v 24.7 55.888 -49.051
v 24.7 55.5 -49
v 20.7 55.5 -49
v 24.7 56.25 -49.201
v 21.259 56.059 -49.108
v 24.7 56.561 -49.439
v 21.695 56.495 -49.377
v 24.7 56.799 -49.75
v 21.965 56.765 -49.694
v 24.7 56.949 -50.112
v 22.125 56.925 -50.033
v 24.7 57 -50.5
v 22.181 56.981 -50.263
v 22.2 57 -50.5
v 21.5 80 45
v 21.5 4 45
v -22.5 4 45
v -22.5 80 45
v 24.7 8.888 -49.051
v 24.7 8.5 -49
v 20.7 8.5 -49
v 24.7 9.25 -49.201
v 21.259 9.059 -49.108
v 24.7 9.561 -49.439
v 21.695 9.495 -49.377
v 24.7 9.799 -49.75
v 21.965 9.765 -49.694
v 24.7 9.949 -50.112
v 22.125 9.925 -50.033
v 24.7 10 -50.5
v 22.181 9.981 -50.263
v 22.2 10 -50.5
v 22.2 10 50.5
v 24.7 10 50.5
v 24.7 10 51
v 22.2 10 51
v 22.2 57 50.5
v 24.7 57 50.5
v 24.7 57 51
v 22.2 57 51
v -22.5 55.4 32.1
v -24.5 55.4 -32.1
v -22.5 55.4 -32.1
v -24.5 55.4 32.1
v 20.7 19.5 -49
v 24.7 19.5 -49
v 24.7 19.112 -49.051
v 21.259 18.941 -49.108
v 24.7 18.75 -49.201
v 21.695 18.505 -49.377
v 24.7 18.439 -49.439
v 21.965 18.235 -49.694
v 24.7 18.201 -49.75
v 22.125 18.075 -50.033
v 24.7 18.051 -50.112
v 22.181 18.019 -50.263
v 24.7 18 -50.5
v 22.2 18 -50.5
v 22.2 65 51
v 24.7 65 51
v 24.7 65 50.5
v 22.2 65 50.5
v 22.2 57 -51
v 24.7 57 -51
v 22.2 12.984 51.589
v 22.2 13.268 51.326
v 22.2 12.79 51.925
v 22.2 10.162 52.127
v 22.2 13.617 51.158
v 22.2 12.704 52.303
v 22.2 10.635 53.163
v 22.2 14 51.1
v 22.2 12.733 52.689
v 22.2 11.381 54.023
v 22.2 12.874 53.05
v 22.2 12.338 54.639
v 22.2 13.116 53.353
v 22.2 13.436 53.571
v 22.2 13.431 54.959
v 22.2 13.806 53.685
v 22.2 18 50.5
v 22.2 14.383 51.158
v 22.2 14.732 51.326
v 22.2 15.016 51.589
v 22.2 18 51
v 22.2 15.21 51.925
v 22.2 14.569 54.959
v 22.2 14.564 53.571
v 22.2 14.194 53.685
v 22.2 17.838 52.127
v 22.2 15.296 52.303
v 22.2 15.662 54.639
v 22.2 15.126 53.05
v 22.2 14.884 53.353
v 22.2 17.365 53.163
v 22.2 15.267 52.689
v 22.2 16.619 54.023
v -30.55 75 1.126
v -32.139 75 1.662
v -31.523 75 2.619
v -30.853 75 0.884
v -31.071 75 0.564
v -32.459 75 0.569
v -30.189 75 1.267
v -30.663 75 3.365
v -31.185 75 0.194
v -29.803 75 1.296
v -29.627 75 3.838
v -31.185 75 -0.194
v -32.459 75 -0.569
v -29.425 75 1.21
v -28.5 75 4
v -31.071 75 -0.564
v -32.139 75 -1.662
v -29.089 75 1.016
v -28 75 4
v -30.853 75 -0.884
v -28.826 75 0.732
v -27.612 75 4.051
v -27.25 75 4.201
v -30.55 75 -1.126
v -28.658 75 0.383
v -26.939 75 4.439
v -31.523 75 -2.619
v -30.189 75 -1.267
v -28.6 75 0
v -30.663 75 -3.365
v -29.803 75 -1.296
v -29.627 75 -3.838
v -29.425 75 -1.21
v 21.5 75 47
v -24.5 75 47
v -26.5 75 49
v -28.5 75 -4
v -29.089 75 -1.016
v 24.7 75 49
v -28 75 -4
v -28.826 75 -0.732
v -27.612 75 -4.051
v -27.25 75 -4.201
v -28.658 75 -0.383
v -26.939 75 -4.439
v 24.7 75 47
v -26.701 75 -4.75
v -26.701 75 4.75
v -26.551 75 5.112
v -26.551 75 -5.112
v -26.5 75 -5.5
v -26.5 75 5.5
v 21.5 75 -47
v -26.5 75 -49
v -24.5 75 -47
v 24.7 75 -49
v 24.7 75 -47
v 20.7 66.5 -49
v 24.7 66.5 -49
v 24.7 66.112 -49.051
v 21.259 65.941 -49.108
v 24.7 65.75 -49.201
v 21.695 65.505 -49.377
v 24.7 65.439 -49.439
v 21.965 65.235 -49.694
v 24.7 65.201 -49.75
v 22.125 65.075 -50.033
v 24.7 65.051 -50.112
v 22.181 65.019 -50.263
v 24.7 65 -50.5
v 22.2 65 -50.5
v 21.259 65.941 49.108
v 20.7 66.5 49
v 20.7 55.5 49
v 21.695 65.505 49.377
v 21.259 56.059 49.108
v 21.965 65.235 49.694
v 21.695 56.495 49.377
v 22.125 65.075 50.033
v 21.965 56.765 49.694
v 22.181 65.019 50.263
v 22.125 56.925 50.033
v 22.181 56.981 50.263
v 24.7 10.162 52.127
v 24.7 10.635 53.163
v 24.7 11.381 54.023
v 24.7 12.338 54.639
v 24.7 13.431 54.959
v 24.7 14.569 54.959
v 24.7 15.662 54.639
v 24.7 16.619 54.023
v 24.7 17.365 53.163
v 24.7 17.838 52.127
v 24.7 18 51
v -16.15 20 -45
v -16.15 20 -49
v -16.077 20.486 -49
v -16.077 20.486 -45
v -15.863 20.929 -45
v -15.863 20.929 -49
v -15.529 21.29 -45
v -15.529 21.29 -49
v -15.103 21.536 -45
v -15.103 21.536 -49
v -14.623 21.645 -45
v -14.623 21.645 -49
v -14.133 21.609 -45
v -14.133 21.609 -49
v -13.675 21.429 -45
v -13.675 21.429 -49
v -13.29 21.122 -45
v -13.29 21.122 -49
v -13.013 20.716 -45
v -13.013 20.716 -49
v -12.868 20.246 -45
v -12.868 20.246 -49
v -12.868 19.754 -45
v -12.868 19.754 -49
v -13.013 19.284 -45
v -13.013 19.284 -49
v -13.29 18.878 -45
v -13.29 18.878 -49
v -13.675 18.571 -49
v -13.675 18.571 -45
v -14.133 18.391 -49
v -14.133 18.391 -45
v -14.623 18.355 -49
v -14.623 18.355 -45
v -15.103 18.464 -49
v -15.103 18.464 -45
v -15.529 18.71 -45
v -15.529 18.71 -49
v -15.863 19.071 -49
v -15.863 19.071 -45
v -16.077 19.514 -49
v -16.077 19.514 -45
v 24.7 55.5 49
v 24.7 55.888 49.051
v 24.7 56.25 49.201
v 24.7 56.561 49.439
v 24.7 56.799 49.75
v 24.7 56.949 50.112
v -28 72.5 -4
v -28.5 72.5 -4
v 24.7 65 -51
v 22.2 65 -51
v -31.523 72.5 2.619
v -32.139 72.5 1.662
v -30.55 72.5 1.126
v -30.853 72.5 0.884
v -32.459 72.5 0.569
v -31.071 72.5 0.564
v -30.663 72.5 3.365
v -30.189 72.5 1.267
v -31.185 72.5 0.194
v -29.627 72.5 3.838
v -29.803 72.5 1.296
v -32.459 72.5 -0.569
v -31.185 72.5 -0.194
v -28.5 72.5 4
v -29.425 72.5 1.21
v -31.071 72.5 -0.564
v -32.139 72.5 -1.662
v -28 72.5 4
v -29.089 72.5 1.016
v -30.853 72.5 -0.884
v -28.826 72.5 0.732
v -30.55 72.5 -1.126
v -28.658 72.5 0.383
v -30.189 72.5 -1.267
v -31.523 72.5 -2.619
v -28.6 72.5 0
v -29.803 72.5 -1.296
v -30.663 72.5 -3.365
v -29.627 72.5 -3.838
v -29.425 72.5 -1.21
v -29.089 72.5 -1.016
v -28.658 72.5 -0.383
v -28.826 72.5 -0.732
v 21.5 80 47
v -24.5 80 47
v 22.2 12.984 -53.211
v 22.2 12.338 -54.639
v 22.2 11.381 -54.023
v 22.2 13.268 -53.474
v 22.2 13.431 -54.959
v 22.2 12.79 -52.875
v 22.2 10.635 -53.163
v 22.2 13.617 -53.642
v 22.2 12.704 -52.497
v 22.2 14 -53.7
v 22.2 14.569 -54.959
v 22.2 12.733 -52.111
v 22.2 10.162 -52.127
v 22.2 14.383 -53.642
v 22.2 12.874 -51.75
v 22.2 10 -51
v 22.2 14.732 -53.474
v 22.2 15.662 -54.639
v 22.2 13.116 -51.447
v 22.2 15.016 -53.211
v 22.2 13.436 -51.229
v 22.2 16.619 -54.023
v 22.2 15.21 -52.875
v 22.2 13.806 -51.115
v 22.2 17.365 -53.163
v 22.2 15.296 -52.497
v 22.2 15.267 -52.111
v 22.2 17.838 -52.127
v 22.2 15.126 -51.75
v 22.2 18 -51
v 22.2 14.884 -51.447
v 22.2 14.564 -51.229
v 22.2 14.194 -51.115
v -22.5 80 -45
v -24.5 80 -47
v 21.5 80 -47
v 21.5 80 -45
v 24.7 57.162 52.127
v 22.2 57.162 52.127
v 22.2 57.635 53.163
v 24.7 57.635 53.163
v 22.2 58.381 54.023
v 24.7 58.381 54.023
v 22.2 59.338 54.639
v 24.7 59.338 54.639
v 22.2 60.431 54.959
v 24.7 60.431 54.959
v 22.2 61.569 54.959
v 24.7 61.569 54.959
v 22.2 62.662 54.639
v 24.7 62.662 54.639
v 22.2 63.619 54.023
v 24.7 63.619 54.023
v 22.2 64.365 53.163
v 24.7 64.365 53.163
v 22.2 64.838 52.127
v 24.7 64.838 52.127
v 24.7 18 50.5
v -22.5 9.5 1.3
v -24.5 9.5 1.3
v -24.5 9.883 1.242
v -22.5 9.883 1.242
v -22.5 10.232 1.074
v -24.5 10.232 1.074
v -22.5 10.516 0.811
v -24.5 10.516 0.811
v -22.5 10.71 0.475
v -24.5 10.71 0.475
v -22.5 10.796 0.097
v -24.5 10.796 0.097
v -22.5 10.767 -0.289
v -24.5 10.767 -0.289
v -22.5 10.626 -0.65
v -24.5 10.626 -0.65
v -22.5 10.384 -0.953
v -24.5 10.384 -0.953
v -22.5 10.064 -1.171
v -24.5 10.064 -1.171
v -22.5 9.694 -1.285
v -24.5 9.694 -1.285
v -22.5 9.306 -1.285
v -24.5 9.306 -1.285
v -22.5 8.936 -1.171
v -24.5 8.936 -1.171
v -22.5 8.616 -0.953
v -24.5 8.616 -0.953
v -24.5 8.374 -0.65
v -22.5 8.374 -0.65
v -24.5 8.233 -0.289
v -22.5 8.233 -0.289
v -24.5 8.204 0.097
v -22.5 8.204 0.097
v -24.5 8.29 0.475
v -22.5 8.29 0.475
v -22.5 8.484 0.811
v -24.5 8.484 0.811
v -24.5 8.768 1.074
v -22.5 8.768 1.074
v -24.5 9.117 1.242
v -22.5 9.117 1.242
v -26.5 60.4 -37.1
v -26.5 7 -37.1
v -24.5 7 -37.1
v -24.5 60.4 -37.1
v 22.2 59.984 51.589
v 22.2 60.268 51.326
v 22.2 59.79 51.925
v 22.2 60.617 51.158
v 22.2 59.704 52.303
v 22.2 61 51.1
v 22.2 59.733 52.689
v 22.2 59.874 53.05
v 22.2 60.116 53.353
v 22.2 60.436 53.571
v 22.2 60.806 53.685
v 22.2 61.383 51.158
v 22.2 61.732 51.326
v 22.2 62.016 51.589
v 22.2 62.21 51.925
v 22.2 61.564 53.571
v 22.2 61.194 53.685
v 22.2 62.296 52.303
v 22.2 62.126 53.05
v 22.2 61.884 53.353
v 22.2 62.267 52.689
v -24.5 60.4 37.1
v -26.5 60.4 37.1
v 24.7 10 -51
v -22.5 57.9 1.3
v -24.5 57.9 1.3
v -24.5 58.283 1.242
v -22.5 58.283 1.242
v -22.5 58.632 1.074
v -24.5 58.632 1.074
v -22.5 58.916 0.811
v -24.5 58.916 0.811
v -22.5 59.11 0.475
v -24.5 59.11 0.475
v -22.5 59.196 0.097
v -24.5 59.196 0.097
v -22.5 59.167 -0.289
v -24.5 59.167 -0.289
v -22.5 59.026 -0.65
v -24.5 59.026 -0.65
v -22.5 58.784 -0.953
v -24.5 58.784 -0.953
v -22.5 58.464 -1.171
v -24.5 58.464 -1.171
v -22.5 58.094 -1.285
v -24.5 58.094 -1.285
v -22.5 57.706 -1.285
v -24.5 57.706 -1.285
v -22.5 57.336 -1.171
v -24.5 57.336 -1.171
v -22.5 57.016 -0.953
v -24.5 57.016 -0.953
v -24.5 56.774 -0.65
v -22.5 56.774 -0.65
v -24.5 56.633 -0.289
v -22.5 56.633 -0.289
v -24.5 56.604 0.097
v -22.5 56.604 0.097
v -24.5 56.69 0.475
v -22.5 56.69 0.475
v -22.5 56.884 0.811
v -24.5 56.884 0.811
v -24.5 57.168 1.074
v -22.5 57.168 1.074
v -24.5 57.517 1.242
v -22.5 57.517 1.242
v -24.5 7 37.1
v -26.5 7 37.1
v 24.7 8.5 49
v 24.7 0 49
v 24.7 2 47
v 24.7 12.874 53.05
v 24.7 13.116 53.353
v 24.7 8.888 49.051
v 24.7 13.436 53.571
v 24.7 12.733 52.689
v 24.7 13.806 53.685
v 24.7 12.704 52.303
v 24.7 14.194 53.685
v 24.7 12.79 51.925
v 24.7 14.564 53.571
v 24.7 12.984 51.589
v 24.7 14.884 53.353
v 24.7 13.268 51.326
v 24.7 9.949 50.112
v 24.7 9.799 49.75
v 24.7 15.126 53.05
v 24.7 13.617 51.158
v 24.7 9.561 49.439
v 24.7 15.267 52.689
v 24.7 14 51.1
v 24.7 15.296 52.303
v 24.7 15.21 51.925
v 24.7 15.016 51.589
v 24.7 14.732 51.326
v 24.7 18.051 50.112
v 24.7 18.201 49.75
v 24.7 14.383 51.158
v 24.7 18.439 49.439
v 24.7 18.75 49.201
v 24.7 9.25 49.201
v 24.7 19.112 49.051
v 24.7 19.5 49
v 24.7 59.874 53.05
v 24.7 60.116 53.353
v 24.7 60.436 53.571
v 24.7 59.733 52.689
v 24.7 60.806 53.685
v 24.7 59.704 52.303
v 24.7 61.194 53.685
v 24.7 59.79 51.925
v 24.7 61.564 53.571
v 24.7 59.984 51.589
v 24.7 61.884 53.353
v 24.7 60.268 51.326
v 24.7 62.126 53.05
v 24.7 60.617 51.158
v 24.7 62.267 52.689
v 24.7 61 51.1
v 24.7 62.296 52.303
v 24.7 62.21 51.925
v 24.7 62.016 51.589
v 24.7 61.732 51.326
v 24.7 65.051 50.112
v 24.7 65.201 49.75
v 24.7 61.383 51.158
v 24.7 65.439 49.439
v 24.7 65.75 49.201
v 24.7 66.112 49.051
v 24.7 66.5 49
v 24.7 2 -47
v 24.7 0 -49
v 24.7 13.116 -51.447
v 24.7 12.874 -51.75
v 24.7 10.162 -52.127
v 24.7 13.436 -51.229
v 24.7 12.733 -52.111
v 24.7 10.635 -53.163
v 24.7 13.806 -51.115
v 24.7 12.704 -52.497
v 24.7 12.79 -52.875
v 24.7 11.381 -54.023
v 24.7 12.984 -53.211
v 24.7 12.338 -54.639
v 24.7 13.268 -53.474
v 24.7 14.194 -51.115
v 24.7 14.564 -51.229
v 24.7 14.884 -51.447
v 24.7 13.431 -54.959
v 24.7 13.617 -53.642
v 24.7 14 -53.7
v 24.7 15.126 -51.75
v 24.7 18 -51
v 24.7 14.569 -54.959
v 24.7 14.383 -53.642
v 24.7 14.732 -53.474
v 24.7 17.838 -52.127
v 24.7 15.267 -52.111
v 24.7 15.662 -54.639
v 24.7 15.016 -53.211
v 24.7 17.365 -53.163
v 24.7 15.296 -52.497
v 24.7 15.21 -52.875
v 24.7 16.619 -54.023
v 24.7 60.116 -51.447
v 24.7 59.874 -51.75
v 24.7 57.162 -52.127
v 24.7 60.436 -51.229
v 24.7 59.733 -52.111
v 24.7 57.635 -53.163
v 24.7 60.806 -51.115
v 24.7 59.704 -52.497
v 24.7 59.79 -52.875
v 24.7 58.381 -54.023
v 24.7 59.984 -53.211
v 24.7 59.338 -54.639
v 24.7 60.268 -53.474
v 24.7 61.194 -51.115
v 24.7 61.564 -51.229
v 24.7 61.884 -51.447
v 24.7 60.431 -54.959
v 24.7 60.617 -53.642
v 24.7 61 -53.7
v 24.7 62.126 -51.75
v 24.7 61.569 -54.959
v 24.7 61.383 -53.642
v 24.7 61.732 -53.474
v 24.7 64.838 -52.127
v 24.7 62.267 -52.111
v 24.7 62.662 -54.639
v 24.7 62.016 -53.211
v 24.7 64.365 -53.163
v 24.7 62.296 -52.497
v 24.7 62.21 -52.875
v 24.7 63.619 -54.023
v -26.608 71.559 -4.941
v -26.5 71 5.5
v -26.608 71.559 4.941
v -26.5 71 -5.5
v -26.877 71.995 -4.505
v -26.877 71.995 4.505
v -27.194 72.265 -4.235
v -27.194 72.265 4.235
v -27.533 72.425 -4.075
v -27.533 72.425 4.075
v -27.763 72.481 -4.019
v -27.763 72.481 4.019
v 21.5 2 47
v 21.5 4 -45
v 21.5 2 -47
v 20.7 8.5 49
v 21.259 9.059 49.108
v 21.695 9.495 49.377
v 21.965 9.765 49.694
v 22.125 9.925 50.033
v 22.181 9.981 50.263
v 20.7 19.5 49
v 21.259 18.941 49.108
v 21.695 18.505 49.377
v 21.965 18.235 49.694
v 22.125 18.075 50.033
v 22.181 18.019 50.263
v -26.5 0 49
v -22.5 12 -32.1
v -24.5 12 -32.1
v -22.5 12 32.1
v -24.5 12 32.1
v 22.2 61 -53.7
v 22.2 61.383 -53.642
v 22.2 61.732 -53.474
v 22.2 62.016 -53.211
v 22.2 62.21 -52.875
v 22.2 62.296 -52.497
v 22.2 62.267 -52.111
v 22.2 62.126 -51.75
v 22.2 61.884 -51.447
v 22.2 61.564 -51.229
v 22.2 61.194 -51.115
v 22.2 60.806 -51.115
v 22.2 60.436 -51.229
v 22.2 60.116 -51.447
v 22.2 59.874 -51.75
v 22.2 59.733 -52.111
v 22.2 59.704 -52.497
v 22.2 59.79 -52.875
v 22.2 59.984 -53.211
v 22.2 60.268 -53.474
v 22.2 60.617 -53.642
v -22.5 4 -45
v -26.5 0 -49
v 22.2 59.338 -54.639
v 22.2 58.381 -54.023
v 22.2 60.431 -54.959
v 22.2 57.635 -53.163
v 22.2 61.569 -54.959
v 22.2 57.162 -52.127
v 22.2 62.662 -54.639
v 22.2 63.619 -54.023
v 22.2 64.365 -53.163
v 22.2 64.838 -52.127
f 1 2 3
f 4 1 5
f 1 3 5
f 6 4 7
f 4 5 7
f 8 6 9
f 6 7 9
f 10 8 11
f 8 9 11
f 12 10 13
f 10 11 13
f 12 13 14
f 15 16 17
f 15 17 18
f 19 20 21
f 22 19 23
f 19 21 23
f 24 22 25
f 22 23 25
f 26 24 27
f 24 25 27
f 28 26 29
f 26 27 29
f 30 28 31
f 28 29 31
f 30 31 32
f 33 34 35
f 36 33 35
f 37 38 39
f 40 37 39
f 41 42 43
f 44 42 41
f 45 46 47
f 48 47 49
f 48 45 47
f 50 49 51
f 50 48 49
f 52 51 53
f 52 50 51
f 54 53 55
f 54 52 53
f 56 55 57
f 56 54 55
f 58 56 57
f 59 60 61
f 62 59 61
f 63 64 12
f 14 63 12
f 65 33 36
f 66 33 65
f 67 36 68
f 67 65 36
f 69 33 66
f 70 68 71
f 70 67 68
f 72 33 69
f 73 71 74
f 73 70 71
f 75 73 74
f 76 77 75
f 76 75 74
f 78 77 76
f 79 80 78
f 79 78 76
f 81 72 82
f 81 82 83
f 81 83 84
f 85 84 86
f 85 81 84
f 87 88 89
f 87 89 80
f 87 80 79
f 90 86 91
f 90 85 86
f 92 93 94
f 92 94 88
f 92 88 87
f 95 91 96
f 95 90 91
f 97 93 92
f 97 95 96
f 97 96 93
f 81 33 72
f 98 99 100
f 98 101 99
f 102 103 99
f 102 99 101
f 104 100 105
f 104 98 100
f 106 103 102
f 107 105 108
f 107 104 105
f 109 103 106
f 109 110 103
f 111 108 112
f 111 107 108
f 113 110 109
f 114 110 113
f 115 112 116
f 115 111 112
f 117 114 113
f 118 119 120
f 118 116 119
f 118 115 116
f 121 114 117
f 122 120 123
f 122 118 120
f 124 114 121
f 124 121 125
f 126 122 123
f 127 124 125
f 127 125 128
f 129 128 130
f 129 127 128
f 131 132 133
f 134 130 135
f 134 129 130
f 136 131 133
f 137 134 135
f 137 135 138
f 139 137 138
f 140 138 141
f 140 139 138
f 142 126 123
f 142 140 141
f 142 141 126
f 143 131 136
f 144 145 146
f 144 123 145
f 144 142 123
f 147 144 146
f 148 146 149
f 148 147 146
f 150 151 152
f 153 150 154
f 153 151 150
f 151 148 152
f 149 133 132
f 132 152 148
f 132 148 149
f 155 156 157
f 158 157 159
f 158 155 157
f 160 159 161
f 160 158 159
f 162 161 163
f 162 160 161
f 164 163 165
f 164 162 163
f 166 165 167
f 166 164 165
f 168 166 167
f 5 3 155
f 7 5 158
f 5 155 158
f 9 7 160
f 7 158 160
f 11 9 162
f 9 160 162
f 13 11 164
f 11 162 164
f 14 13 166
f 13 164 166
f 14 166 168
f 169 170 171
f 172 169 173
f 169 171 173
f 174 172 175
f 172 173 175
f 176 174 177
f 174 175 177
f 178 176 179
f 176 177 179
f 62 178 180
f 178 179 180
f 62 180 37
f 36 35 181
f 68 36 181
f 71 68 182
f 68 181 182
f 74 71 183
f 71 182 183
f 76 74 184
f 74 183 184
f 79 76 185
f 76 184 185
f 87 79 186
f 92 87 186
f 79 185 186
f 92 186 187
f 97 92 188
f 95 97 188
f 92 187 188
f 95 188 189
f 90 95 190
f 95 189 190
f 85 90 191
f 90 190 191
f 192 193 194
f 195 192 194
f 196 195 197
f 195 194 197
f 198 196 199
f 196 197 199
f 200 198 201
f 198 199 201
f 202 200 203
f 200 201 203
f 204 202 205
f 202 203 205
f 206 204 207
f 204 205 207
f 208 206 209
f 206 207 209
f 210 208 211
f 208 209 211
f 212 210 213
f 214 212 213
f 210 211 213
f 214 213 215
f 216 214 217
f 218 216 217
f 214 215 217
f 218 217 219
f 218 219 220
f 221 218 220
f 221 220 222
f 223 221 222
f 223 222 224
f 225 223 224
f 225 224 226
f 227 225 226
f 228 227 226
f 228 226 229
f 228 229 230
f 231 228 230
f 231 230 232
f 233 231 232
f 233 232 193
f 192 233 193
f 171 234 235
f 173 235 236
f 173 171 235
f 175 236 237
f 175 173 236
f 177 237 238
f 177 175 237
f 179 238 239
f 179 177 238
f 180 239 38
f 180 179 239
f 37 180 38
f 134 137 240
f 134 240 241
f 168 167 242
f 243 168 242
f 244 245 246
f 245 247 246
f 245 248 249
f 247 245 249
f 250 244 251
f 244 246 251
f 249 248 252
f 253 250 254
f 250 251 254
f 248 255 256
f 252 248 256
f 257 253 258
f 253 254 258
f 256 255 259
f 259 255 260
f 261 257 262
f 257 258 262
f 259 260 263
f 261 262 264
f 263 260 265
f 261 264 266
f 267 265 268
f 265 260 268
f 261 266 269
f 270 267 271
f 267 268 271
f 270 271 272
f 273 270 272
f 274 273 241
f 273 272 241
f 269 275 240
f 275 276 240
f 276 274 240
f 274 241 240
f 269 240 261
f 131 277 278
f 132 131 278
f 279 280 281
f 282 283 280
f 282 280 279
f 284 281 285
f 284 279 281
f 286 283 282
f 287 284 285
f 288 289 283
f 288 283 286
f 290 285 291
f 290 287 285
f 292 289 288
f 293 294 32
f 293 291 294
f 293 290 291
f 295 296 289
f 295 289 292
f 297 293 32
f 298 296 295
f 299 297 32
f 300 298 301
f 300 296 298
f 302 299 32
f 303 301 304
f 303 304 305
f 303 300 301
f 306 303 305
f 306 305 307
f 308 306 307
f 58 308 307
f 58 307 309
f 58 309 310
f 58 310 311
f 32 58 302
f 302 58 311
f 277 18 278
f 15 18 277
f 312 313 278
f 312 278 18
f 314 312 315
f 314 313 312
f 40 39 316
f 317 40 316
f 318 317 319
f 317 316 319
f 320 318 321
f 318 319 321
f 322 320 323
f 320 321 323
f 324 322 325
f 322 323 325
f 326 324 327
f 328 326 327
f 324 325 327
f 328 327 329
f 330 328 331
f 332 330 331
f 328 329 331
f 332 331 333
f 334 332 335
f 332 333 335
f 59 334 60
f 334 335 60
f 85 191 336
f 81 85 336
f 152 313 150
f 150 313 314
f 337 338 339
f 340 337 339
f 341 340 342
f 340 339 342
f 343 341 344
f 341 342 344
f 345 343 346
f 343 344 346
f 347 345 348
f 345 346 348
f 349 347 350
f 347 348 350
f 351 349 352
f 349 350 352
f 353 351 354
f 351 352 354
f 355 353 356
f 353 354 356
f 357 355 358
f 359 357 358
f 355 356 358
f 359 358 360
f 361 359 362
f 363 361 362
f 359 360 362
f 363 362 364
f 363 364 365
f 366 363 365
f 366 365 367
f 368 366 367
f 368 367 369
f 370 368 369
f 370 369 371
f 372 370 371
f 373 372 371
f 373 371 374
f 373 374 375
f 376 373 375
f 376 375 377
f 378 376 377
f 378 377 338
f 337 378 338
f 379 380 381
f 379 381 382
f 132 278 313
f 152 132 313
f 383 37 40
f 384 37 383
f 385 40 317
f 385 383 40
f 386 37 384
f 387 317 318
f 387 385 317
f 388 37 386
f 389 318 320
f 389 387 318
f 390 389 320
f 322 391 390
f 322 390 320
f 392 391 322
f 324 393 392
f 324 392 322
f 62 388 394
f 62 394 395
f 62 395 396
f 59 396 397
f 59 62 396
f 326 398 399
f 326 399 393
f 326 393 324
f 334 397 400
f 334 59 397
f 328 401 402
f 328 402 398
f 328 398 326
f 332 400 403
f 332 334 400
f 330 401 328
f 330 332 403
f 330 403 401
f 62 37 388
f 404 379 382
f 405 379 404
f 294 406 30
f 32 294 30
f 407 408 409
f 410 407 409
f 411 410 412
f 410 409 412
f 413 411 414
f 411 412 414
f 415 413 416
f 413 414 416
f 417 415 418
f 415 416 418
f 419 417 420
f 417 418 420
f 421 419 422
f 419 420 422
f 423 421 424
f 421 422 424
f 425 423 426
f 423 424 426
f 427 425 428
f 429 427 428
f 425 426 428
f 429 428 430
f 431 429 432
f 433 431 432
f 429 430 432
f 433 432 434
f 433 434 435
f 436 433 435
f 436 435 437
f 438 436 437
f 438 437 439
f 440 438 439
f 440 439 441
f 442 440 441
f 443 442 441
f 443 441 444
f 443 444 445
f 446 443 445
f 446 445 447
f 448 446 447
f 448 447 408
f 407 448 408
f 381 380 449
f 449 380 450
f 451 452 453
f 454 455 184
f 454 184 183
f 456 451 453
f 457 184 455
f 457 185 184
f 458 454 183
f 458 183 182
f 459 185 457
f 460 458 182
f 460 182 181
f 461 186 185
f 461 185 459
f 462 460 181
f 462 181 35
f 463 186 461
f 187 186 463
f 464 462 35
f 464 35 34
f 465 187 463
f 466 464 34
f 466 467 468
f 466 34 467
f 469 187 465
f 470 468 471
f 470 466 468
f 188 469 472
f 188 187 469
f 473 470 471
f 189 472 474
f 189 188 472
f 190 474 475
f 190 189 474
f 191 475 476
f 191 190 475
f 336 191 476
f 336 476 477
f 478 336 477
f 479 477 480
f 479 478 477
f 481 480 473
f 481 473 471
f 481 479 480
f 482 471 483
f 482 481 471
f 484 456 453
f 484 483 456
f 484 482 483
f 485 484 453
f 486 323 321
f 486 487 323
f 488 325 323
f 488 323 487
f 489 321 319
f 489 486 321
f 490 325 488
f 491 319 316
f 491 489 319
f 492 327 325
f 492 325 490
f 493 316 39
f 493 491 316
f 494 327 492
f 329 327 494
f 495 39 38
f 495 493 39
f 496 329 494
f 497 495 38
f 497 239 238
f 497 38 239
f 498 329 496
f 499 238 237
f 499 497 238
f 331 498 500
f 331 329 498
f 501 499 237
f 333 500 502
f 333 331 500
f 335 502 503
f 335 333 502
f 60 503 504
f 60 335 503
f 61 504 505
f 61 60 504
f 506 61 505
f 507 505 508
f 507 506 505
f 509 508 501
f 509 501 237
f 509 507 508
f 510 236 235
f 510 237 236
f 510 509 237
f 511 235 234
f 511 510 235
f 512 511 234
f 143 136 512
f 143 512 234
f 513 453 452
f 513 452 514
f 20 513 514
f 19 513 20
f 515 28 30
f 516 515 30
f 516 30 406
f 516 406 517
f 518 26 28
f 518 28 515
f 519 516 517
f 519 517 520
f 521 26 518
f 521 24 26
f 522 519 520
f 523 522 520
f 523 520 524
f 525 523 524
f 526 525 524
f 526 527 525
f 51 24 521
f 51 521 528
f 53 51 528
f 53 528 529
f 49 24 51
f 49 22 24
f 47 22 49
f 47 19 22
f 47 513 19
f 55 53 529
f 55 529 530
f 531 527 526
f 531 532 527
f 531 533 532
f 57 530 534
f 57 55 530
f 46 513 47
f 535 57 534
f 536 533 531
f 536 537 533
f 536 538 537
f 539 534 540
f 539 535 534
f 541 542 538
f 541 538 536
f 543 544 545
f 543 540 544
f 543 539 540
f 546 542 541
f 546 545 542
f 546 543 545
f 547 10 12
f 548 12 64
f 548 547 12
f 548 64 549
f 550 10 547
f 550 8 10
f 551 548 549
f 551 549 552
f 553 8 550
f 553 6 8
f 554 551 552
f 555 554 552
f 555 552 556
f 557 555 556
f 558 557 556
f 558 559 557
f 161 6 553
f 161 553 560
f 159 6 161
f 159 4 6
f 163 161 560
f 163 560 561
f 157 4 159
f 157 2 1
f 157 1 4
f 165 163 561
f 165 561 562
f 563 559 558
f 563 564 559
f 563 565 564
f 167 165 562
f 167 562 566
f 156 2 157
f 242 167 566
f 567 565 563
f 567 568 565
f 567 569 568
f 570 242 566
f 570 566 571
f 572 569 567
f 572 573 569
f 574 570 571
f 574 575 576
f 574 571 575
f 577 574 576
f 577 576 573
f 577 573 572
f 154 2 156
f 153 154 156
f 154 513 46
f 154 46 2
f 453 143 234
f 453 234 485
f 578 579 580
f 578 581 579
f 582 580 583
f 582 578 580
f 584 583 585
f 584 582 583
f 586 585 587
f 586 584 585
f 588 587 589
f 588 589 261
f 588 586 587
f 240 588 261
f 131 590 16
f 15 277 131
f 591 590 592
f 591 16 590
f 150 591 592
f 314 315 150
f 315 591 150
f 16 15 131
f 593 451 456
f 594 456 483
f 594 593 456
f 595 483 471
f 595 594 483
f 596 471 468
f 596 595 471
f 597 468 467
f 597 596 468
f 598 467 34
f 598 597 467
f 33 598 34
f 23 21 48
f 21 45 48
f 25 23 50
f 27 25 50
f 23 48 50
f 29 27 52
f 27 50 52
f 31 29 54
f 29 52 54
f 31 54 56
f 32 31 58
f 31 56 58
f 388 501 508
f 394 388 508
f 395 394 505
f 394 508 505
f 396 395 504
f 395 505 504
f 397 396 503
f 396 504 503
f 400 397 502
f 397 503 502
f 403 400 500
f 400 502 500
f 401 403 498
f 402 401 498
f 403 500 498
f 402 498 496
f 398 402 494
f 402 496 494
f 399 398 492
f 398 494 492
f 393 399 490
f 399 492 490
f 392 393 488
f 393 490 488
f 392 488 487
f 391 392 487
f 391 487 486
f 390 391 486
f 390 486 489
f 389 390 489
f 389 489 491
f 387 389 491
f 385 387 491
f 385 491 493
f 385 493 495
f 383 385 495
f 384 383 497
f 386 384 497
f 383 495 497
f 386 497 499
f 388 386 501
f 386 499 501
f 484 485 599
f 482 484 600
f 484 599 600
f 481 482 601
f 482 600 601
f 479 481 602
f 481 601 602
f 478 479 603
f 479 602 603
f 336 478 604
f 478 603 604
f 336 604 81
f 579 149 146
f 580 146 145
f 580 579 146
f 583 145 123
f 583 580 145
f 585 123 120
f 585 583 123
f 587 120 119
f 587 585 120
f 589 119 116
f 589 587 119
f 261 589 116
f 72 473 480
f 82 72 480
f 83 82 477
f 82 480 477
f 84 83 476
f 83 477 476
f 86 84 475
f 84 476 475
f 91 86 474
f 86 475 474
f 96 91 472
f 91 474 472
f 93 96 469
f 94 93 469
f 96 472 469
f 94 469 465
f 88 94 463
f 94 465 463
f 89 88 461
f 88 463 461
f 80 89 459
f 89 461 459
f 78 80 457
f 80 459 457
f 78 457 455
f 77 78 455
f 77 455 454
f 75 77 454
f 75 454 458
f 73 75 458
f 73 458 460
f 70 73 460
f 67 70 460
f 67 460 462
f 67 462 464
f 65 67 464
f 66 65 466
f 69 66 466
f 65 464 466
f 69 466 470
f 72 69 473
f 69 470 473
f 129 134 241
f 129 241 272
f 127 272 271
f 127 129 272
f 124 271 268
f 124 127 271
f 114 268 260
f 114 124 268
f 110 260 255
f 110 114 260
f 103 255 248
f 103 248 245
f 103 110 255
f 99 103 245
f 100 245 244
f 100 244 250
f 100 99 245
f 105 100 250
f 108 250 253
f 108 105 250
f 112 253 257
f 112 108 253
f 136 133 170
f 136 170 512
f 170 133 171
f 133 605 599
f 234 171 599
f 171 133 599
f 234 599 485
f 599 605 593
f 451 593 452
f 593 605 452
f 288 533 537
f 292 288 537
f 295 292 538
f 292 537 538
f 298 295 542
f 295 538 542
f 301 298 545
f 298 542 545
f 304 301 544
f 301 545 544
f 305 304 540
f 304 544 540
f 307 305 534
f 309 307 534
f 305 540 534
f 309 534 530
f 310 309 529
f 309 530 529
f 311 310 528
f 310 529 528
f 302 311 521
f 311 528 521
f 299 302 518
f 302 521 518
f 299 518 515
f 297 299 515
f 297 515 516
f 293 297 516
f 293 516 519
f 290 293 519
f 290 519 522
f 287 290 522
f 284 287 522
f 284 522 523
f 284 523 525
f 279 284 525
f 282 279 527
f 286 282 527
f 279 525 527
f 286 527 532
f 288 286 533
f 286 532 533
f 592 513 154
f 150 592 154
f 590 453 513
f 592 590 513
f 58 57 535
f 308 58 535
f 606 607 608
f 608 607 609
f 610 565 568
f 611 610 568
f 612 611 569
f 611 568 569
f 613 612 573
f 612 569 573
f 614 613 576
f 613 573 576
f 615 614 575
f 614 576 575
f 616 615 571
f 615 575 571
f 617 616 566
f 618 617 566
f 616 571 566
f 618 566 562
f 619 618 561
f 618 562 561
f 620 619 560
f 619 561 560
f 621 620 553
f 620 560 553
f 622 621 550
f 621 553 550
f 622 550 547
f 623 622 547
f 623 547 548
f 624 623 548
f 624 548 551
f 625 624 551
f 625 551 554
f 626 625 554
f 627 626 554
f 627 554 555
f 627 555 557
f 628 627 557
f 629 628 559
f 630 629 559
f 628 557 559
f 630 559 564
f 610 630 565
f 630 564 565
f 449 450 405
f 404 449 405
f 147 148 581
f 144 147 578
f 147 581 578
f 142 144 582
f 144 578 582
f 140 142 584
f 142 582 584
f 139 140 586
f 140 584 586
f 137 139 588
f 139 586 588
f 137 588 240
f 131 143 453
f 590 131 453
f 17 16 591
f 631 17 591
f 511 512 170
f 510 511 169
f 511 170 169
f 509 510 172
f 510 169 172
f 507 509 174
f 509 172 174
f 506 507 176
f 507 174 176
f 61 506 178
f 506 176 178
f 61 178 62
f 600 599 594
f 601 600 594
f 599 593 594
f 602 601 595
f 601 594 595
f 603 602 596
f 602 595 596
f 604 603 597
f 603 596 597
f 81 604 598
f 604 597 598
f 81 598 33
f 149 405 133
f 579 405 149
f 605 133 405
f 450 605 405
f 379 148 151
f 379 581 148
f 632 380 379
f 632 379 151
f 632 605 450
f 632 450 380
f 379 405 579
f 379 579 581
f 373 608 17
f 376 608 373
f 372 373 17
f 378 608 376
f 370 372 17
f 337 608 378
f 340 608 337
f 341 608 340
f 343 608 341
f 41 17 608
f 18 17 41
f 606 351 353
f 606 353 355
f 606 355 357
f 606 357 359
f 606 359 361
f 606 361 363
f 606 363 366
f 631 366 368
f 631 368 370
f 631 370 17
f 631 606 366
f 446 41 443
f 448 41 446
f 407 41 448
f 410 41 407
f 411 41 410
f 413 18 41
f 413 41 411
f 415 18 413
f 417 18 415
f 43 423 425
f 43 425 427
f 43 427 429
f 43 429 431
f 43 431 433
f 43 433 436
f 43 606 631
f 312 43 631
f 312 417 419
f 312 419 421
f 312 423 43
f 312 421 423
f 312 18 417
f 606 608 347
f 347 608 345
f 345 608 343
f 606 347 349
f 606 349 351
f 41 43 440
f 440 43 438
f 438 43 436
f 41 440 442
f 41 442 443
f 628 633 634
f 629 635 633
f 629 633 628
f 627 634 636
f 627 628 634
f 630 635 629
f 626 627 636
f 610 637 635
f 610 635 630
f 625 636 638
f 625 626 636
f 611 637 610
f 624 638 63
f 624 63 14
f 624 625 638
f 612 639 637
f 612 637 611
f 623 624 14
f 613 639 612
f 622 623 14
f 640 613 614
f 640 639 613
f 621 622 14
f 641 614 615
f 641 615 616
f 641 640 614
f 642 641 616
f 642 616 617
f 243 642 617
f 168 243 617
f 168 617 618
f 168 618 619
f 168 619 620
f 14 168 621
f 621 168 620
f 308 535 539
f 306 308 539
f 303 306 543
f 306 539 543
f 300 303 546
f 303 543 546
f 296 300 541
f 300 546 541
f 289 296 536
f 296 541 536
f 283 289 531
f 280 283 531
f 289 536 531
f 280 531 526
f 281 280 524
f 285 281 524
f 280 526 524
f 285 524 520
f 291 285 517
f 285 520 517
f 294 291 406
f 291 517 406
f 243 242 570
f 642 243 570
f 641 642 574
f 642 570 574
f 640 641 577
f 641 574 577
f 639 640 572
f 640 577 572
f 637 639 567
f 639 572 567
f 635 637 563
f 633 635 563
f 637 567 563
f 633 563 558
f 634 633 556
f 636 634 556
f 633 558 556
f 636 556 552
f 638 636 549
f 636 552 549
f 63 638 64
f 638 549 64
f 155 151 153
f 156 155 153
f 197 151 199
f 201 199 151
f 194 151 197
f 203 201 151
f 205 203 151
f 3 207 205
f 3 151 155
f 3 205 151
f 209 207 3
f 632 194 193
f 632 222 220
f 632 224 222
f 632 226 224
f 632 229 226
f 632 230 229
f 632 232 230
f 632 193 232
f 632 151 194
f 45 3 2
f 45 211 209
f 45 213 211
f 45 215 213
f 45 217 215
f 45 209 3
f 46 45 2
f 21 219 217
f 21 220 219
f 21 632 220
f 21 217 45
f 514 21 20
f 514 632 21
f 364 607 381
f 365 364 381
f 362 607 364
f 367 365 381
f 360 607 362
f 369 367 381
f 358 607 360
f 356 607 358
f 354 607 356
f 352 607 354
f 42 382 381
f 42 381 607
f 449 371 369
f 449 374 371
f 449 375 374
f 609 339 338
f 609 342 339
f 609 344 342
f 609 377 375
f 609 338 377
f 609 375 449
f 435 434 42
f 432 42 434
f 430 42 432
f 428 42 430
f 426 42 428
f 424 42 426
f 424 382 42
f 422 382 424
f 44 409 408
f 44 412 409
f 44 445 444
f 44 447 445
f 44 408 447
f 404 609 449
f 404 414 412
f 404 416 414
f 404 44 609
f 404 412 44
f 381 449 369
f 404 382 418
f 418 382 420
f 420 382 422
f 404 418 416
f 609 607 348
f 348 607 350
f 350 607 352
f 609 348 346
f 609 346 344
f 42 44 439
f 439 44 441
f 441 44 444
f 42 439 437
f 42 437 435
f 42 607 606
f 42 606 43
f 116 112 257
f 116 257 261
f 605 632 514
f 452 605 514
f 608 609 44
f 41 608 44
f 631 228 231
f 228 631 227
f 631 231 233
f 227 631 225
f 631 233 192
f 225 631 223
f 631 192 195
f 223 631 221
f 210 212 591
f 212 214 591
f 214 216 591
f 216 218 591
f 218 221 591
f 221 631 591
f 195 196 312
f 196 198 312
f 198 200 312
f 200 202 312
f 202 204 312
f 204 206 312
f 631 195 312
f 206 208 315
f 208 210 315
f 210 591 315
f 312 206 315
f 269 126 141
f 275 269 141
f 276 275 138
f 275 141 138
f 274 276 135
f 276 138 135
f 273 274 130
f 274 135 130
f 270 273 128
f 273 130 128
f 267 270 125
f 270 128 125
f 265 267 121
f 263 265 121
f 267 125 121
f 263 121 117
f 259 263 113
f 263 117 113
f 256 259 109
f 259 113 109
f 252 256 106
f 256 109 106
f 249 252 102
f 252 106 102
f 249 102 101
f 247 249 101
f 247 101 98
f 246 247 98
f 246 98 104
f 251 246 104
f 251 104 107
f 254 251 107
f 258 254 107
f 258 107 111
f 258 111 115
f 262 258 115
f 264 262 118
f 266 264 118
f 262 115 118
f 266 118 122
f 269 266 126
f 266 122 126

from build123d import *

# Parameters (mm, degrees)
SKETCH1_W           = 53
SKETCH1_H           = 98
BOSS_EXTRUDE1_DEPTH = 80
SKETCH2_W           = 90
SKETCH2_H           = 76
CUT_EXTRUDE1_DEPTH  = 49
SKETCH3_W           = 51
SKETCH3_H           = 2
CUT_EXTRUDE2_DEPTH  = 5
SKETCH5_W           = 2
SKETCH5_H           = 76
CUT_EXTRUDE3_DEPTH  = 5
CUT_EXTRUDE4_DEPTH  = 1.8
SKETCH8_R           = 1.3
BOSS_EXTRUDE3_DEPTH = 2.5
FILLET2_R           = 1.5
SKETCH9_R           = 1.3
BOSS_EXTRUDE4_DEPTH = 2.5
FILLET4_R           = 1.5
CUT_EXTRUDE6_REACH  = 53.2
SKETCH14_W          = 64.2
SKETCH14_H          = 43.4
SKETCH15_W          = 74.2
SKETCH15_H          = 53.4
CUT_EXTRUDE7_DEPTH  = 2
CUT_EXTRUDE8_REACH  = 51.2
SKETCH16_R          = 1.3
CUT_EXTRUDE12_REACH = 106
SKETCH29_R          = 1.65


with BuildPart() as part:
    # Sketch1 → Boss-Extrude1 (new body)
    with BuildSketch(Plane(origin=(0, 0, 0), x_dir=(1, 0, 0), z_dir=(0, 1, 0))):
        Rectangle(SKETCH1_W, SKETCH1_H)
    extrude(amount=BOSS_EXTRUDE1_DEPTH)

    # Sketch2 → Cut-Extrude1 (cut)
    with BuildSketch(Plane(origin=(26.5, 0, 0), x_dir=(0, 0, -1), z_dir=(1, 0, 0))):
        with Locations((0, 42)):
            Rectangle(SKETCH2_W, SKETCH2_H)
    extrude(amount=-CUT_EXTRUDE1_DEPTH, mode=Mode.SUBTRACT)

    # Sketch3 → Cut-Extrude2 (cut)
    with BuildSketch(Plane(origin=(0, 80, 0), x_dir=(1, 0, 0), z_dir=(0, 1, 0))):
        Polygon((-26.5, -49), (26.5, -49), (26.5, -47), (-24.5, -47), (-26.5, -47), align=None)
        Polygon((-26.5, 49), (-26.5, -47), (-24.5, -47), (-24.5, 47), (-24.5, 49), align=None)
        with Locations((1, 48)):
            Rectangle(SKETCH3_W, SKETCH3_H)
    extrude(amount=-CUT_EXTRUDE2_DEPTH, mode=Mode.SUBTRACT)

    # Sketch5 → Cut-Extrude3 (cut)
    with BuildSketch(Plane(origin=(26.5, 0, 0), x_dir=(0, 0, -1), z_dir=(1, 0, 0))):
        with Locations((-46, 42)):
            Rectangle(SKETCH5_W, SKETCH5_H)
        Polygon((-45, 4), (-47, 4), (-47, 2), (47, 2), (47, 4), (45, 4), align=None)
        with Locations((46, 42)):
            Rectangle(SKETCH5_W, SKETCH5_H)
    extrude(amount=-CUT_EXTRUDE3_DEPTH, mode=Mode.SUBTRACT)

    # Sketch6 → Cut-Extrude4 (cut)
    with BuildSketch(Plane(origin=(26.5, 0, 0), x_dir=(0, 0, -1), z_dir=(1, 0, 0))):
        Polygon((47, 75), (47, 2), (-47, 2), (-47, 75), (-49, 75), (-49, 0), (49, 0), (49, 75), align=None)
    extrude(amount=-CUT_EXTRUDE4_DEPTH, mode=Mode.SUBTRACT)

    # Sketch8 → Boss-Extrude3 (add)
    with BuildSketch(Plane(origin=(24.7, 0, 0), x_dir=(0, 0, -1), z_dir=(1, 0, 0))):
        with BuildLine():
            Line((-49, 10), (-51, 10))
            ThreePointArc((-51, 10), (-55, 14), (-51, 18))
            Line((-51, 18), (-49, 18))
            Line((-49, 18), (-49, 10))
        make_face()
        with Locations((-52.4, 14)):
            Circle(SKETCH8_R, mode=Mode.SUBTRACT)
        with BuildLine():
            Line((-49, 65), (-49, 57))
            Line((-49, 57), (-51, 57))
            ThreePointArc((-51, 57), (-55, 61), (-51, 65))
            Line((-51, 65), (-49, 65))
        make_face()
        with Locations((-52.4, 61)):
            Circle(SKETCH8_R, mode=Mode.SUBTRACT)
        with BuildLine():
            Line((49, 10), (49, 18))
            Line((49, 18), (51, 18))
            ThreePointArc((51, 18), (55, 14), (51, 10))
            Line((51, 10), (49, 10))
        make_face()
        with Locations((52.4, 14)):
            Circle(SKETCH8_R, mode=Mode.SUBTRACT)
        with BuildLine():
            Line((49, 65), (51, 65))
            ThreePointArc((51, 65), (55, 61), (51, 57))
            Line((51, 57), (49, 57))
            Line((49, 57), (49, 65))
        make_face()
        with Locations((52.4, 61)):
            Circle(SKETCH8_R, mode=Mode.SUBTRACT)
    extrude(amount=-BOSS_EXTRUDE3_DEPTH)

    # Fillet2
    fillet2_edges = [part.edges().sort_by_distance(p)[0] for p in [
        (22.2, 14, 49),
        (23.45, 18, 49),
        (23.45, 10, 49),
        (22.2, 61, 49),
        (23.45, 65, 49),
        (23.45, 57, 49),
        (22.2, 14, -49),
        (23.45, 10, -49),
        (23.45, 18, -49),
        (22.2, 61, -49),
        (23.45, 57, -49),
        (23.45, 65, -49),
    ]]
    fillet(fillet2_edges, radius=FILLET2_R)

    # Sketch9 → Boss-Extrude4 (add)
    with BuildSketch(Plane(origin=(0, 75, 0), x_dir=(1, 0, 0), z_dir=(0, 1, 0))):
        with BuildLine():
            Line((-26.5, 4), (-28.5, 4))
            ThreePointArc((-28.5, 4), (-32.5, 0), (-28.5, -4))
            Line((-28.5, -4), (-26.5, -4))
            Line((-26.5, -4), (-26.5, 4))
        make_face()
        with Locations((-29.9, 0)):
            Circle(SKETCH9_R, mode=Mode.SUBTRACT)
    extrude(amount=-BOSS_EXTRUDE4_DEPTH)

    # Fillet4
    fillet4_edges = [part.edges().sort_by_distance(p)[0] for p in [
        (-26.5, 72.5, 0),
        (-26.5, 73.75, -4),
        (-26.5, 73.75, 4),
    ]]
    fillet(fillet4_edges, radius=FILLET4_R)

    # Sketch14 → Cut-Extrude6 (cut, up to next)
    with BuildSketch(Plane.ZY.offset(26.5), mode=Mode.PRIVATE) as cut_extrude6_sk1:
        with Locations((0, 33.7)):
            Rectangle(SKETCH14_W, SKETCH14_H)
    cut_extrude6_tool1 = extrude(cut_extrude6_sk1.sketch, amount=-CUT_EXTRUDE6_REACH, mode=Mode.PRIVATE) & part.part
    add(cut_extrude6_tool1.solids().sort_by_distance((-26.5, 33.7, 0))[0], mode=Mode.SUBTRACT)

    # Sketch15 → Cut-Extrude7 (cut)
    with BuildSketch(Plane.ZY.offset(26.5)):
        with Locations((0, 33.7)):
            Rectangle(SKETCH15_W, SKETCH15_H)
    extrude(amount=-CUT_EXTRUDE7_DEPTH, mode=Mode.SUBTRACT)

    # Sketch16 → Cut-Extrude8 (cut, up to next)
    with BuildSketch(Plane.ZY.offset(24.5), mode=Mode.PRIVATE) as cut_extrude8_sk1:
        with Locations((0, 57.9)):
            Circle(SKETCH16_R)
    cut_extrude8_tool1 = extrude(cut_extrude8_sk1.sketch, amount=-CUT_EXTRUDE8_REACH, mode=Mode.PRIVATE) & part.part
    add(cut_extrude8_tool1.solids().sort_by_distance((-24.5, 57.9, 0))[0], mode=Mode.SUBTRACT)
    # Sketch16 → Cut-Extrude8 (cut, up to next)
    with BuildSketch(Plane.ZY.offset(24.5), mode=Mode.PRIVATE) as cut_extrude8_sk2:
        with Locations((0, 9.5)):
            Circle(SKETCH16_R)
    cut_extrude8_tool2 = extrude(cut_extrude8_sk2.sketch, amount=-CUT_EXTRUDE8_REACH, mode=Mode.PRIVATE) & part.part
    add(cut_extrude8_tool2.solids().sort_by_distance((-24.5, 9.5, 0))[0], mode=Mode.SUBTRACT)

    # Sketch29 → Cut-Extrude12 (cut, up to next)
    with BuildSketch(Plane(origin=(0, 0, -49), x_dir=(-1, 0, 0), z_dir=(0, 0, -1)), mode=Mode.PRIVATE) as cut_extrude12_sk1:
        with Locations((14.5, 20)):
            Circle(SKETCH29_R)
    cut_extrude12_tool1 = extrude(cut_extrude12_sk1.sketch, amount=-CUT_EXTRUDE12_REACH, mode=Mode.PRIVATE) & part.part
    add(cut_extrude12_tool1.solids().sort_by_distance((-14.5, 20, -49))[0], mode=Mode.SUBTRACT)


solid = part.part
